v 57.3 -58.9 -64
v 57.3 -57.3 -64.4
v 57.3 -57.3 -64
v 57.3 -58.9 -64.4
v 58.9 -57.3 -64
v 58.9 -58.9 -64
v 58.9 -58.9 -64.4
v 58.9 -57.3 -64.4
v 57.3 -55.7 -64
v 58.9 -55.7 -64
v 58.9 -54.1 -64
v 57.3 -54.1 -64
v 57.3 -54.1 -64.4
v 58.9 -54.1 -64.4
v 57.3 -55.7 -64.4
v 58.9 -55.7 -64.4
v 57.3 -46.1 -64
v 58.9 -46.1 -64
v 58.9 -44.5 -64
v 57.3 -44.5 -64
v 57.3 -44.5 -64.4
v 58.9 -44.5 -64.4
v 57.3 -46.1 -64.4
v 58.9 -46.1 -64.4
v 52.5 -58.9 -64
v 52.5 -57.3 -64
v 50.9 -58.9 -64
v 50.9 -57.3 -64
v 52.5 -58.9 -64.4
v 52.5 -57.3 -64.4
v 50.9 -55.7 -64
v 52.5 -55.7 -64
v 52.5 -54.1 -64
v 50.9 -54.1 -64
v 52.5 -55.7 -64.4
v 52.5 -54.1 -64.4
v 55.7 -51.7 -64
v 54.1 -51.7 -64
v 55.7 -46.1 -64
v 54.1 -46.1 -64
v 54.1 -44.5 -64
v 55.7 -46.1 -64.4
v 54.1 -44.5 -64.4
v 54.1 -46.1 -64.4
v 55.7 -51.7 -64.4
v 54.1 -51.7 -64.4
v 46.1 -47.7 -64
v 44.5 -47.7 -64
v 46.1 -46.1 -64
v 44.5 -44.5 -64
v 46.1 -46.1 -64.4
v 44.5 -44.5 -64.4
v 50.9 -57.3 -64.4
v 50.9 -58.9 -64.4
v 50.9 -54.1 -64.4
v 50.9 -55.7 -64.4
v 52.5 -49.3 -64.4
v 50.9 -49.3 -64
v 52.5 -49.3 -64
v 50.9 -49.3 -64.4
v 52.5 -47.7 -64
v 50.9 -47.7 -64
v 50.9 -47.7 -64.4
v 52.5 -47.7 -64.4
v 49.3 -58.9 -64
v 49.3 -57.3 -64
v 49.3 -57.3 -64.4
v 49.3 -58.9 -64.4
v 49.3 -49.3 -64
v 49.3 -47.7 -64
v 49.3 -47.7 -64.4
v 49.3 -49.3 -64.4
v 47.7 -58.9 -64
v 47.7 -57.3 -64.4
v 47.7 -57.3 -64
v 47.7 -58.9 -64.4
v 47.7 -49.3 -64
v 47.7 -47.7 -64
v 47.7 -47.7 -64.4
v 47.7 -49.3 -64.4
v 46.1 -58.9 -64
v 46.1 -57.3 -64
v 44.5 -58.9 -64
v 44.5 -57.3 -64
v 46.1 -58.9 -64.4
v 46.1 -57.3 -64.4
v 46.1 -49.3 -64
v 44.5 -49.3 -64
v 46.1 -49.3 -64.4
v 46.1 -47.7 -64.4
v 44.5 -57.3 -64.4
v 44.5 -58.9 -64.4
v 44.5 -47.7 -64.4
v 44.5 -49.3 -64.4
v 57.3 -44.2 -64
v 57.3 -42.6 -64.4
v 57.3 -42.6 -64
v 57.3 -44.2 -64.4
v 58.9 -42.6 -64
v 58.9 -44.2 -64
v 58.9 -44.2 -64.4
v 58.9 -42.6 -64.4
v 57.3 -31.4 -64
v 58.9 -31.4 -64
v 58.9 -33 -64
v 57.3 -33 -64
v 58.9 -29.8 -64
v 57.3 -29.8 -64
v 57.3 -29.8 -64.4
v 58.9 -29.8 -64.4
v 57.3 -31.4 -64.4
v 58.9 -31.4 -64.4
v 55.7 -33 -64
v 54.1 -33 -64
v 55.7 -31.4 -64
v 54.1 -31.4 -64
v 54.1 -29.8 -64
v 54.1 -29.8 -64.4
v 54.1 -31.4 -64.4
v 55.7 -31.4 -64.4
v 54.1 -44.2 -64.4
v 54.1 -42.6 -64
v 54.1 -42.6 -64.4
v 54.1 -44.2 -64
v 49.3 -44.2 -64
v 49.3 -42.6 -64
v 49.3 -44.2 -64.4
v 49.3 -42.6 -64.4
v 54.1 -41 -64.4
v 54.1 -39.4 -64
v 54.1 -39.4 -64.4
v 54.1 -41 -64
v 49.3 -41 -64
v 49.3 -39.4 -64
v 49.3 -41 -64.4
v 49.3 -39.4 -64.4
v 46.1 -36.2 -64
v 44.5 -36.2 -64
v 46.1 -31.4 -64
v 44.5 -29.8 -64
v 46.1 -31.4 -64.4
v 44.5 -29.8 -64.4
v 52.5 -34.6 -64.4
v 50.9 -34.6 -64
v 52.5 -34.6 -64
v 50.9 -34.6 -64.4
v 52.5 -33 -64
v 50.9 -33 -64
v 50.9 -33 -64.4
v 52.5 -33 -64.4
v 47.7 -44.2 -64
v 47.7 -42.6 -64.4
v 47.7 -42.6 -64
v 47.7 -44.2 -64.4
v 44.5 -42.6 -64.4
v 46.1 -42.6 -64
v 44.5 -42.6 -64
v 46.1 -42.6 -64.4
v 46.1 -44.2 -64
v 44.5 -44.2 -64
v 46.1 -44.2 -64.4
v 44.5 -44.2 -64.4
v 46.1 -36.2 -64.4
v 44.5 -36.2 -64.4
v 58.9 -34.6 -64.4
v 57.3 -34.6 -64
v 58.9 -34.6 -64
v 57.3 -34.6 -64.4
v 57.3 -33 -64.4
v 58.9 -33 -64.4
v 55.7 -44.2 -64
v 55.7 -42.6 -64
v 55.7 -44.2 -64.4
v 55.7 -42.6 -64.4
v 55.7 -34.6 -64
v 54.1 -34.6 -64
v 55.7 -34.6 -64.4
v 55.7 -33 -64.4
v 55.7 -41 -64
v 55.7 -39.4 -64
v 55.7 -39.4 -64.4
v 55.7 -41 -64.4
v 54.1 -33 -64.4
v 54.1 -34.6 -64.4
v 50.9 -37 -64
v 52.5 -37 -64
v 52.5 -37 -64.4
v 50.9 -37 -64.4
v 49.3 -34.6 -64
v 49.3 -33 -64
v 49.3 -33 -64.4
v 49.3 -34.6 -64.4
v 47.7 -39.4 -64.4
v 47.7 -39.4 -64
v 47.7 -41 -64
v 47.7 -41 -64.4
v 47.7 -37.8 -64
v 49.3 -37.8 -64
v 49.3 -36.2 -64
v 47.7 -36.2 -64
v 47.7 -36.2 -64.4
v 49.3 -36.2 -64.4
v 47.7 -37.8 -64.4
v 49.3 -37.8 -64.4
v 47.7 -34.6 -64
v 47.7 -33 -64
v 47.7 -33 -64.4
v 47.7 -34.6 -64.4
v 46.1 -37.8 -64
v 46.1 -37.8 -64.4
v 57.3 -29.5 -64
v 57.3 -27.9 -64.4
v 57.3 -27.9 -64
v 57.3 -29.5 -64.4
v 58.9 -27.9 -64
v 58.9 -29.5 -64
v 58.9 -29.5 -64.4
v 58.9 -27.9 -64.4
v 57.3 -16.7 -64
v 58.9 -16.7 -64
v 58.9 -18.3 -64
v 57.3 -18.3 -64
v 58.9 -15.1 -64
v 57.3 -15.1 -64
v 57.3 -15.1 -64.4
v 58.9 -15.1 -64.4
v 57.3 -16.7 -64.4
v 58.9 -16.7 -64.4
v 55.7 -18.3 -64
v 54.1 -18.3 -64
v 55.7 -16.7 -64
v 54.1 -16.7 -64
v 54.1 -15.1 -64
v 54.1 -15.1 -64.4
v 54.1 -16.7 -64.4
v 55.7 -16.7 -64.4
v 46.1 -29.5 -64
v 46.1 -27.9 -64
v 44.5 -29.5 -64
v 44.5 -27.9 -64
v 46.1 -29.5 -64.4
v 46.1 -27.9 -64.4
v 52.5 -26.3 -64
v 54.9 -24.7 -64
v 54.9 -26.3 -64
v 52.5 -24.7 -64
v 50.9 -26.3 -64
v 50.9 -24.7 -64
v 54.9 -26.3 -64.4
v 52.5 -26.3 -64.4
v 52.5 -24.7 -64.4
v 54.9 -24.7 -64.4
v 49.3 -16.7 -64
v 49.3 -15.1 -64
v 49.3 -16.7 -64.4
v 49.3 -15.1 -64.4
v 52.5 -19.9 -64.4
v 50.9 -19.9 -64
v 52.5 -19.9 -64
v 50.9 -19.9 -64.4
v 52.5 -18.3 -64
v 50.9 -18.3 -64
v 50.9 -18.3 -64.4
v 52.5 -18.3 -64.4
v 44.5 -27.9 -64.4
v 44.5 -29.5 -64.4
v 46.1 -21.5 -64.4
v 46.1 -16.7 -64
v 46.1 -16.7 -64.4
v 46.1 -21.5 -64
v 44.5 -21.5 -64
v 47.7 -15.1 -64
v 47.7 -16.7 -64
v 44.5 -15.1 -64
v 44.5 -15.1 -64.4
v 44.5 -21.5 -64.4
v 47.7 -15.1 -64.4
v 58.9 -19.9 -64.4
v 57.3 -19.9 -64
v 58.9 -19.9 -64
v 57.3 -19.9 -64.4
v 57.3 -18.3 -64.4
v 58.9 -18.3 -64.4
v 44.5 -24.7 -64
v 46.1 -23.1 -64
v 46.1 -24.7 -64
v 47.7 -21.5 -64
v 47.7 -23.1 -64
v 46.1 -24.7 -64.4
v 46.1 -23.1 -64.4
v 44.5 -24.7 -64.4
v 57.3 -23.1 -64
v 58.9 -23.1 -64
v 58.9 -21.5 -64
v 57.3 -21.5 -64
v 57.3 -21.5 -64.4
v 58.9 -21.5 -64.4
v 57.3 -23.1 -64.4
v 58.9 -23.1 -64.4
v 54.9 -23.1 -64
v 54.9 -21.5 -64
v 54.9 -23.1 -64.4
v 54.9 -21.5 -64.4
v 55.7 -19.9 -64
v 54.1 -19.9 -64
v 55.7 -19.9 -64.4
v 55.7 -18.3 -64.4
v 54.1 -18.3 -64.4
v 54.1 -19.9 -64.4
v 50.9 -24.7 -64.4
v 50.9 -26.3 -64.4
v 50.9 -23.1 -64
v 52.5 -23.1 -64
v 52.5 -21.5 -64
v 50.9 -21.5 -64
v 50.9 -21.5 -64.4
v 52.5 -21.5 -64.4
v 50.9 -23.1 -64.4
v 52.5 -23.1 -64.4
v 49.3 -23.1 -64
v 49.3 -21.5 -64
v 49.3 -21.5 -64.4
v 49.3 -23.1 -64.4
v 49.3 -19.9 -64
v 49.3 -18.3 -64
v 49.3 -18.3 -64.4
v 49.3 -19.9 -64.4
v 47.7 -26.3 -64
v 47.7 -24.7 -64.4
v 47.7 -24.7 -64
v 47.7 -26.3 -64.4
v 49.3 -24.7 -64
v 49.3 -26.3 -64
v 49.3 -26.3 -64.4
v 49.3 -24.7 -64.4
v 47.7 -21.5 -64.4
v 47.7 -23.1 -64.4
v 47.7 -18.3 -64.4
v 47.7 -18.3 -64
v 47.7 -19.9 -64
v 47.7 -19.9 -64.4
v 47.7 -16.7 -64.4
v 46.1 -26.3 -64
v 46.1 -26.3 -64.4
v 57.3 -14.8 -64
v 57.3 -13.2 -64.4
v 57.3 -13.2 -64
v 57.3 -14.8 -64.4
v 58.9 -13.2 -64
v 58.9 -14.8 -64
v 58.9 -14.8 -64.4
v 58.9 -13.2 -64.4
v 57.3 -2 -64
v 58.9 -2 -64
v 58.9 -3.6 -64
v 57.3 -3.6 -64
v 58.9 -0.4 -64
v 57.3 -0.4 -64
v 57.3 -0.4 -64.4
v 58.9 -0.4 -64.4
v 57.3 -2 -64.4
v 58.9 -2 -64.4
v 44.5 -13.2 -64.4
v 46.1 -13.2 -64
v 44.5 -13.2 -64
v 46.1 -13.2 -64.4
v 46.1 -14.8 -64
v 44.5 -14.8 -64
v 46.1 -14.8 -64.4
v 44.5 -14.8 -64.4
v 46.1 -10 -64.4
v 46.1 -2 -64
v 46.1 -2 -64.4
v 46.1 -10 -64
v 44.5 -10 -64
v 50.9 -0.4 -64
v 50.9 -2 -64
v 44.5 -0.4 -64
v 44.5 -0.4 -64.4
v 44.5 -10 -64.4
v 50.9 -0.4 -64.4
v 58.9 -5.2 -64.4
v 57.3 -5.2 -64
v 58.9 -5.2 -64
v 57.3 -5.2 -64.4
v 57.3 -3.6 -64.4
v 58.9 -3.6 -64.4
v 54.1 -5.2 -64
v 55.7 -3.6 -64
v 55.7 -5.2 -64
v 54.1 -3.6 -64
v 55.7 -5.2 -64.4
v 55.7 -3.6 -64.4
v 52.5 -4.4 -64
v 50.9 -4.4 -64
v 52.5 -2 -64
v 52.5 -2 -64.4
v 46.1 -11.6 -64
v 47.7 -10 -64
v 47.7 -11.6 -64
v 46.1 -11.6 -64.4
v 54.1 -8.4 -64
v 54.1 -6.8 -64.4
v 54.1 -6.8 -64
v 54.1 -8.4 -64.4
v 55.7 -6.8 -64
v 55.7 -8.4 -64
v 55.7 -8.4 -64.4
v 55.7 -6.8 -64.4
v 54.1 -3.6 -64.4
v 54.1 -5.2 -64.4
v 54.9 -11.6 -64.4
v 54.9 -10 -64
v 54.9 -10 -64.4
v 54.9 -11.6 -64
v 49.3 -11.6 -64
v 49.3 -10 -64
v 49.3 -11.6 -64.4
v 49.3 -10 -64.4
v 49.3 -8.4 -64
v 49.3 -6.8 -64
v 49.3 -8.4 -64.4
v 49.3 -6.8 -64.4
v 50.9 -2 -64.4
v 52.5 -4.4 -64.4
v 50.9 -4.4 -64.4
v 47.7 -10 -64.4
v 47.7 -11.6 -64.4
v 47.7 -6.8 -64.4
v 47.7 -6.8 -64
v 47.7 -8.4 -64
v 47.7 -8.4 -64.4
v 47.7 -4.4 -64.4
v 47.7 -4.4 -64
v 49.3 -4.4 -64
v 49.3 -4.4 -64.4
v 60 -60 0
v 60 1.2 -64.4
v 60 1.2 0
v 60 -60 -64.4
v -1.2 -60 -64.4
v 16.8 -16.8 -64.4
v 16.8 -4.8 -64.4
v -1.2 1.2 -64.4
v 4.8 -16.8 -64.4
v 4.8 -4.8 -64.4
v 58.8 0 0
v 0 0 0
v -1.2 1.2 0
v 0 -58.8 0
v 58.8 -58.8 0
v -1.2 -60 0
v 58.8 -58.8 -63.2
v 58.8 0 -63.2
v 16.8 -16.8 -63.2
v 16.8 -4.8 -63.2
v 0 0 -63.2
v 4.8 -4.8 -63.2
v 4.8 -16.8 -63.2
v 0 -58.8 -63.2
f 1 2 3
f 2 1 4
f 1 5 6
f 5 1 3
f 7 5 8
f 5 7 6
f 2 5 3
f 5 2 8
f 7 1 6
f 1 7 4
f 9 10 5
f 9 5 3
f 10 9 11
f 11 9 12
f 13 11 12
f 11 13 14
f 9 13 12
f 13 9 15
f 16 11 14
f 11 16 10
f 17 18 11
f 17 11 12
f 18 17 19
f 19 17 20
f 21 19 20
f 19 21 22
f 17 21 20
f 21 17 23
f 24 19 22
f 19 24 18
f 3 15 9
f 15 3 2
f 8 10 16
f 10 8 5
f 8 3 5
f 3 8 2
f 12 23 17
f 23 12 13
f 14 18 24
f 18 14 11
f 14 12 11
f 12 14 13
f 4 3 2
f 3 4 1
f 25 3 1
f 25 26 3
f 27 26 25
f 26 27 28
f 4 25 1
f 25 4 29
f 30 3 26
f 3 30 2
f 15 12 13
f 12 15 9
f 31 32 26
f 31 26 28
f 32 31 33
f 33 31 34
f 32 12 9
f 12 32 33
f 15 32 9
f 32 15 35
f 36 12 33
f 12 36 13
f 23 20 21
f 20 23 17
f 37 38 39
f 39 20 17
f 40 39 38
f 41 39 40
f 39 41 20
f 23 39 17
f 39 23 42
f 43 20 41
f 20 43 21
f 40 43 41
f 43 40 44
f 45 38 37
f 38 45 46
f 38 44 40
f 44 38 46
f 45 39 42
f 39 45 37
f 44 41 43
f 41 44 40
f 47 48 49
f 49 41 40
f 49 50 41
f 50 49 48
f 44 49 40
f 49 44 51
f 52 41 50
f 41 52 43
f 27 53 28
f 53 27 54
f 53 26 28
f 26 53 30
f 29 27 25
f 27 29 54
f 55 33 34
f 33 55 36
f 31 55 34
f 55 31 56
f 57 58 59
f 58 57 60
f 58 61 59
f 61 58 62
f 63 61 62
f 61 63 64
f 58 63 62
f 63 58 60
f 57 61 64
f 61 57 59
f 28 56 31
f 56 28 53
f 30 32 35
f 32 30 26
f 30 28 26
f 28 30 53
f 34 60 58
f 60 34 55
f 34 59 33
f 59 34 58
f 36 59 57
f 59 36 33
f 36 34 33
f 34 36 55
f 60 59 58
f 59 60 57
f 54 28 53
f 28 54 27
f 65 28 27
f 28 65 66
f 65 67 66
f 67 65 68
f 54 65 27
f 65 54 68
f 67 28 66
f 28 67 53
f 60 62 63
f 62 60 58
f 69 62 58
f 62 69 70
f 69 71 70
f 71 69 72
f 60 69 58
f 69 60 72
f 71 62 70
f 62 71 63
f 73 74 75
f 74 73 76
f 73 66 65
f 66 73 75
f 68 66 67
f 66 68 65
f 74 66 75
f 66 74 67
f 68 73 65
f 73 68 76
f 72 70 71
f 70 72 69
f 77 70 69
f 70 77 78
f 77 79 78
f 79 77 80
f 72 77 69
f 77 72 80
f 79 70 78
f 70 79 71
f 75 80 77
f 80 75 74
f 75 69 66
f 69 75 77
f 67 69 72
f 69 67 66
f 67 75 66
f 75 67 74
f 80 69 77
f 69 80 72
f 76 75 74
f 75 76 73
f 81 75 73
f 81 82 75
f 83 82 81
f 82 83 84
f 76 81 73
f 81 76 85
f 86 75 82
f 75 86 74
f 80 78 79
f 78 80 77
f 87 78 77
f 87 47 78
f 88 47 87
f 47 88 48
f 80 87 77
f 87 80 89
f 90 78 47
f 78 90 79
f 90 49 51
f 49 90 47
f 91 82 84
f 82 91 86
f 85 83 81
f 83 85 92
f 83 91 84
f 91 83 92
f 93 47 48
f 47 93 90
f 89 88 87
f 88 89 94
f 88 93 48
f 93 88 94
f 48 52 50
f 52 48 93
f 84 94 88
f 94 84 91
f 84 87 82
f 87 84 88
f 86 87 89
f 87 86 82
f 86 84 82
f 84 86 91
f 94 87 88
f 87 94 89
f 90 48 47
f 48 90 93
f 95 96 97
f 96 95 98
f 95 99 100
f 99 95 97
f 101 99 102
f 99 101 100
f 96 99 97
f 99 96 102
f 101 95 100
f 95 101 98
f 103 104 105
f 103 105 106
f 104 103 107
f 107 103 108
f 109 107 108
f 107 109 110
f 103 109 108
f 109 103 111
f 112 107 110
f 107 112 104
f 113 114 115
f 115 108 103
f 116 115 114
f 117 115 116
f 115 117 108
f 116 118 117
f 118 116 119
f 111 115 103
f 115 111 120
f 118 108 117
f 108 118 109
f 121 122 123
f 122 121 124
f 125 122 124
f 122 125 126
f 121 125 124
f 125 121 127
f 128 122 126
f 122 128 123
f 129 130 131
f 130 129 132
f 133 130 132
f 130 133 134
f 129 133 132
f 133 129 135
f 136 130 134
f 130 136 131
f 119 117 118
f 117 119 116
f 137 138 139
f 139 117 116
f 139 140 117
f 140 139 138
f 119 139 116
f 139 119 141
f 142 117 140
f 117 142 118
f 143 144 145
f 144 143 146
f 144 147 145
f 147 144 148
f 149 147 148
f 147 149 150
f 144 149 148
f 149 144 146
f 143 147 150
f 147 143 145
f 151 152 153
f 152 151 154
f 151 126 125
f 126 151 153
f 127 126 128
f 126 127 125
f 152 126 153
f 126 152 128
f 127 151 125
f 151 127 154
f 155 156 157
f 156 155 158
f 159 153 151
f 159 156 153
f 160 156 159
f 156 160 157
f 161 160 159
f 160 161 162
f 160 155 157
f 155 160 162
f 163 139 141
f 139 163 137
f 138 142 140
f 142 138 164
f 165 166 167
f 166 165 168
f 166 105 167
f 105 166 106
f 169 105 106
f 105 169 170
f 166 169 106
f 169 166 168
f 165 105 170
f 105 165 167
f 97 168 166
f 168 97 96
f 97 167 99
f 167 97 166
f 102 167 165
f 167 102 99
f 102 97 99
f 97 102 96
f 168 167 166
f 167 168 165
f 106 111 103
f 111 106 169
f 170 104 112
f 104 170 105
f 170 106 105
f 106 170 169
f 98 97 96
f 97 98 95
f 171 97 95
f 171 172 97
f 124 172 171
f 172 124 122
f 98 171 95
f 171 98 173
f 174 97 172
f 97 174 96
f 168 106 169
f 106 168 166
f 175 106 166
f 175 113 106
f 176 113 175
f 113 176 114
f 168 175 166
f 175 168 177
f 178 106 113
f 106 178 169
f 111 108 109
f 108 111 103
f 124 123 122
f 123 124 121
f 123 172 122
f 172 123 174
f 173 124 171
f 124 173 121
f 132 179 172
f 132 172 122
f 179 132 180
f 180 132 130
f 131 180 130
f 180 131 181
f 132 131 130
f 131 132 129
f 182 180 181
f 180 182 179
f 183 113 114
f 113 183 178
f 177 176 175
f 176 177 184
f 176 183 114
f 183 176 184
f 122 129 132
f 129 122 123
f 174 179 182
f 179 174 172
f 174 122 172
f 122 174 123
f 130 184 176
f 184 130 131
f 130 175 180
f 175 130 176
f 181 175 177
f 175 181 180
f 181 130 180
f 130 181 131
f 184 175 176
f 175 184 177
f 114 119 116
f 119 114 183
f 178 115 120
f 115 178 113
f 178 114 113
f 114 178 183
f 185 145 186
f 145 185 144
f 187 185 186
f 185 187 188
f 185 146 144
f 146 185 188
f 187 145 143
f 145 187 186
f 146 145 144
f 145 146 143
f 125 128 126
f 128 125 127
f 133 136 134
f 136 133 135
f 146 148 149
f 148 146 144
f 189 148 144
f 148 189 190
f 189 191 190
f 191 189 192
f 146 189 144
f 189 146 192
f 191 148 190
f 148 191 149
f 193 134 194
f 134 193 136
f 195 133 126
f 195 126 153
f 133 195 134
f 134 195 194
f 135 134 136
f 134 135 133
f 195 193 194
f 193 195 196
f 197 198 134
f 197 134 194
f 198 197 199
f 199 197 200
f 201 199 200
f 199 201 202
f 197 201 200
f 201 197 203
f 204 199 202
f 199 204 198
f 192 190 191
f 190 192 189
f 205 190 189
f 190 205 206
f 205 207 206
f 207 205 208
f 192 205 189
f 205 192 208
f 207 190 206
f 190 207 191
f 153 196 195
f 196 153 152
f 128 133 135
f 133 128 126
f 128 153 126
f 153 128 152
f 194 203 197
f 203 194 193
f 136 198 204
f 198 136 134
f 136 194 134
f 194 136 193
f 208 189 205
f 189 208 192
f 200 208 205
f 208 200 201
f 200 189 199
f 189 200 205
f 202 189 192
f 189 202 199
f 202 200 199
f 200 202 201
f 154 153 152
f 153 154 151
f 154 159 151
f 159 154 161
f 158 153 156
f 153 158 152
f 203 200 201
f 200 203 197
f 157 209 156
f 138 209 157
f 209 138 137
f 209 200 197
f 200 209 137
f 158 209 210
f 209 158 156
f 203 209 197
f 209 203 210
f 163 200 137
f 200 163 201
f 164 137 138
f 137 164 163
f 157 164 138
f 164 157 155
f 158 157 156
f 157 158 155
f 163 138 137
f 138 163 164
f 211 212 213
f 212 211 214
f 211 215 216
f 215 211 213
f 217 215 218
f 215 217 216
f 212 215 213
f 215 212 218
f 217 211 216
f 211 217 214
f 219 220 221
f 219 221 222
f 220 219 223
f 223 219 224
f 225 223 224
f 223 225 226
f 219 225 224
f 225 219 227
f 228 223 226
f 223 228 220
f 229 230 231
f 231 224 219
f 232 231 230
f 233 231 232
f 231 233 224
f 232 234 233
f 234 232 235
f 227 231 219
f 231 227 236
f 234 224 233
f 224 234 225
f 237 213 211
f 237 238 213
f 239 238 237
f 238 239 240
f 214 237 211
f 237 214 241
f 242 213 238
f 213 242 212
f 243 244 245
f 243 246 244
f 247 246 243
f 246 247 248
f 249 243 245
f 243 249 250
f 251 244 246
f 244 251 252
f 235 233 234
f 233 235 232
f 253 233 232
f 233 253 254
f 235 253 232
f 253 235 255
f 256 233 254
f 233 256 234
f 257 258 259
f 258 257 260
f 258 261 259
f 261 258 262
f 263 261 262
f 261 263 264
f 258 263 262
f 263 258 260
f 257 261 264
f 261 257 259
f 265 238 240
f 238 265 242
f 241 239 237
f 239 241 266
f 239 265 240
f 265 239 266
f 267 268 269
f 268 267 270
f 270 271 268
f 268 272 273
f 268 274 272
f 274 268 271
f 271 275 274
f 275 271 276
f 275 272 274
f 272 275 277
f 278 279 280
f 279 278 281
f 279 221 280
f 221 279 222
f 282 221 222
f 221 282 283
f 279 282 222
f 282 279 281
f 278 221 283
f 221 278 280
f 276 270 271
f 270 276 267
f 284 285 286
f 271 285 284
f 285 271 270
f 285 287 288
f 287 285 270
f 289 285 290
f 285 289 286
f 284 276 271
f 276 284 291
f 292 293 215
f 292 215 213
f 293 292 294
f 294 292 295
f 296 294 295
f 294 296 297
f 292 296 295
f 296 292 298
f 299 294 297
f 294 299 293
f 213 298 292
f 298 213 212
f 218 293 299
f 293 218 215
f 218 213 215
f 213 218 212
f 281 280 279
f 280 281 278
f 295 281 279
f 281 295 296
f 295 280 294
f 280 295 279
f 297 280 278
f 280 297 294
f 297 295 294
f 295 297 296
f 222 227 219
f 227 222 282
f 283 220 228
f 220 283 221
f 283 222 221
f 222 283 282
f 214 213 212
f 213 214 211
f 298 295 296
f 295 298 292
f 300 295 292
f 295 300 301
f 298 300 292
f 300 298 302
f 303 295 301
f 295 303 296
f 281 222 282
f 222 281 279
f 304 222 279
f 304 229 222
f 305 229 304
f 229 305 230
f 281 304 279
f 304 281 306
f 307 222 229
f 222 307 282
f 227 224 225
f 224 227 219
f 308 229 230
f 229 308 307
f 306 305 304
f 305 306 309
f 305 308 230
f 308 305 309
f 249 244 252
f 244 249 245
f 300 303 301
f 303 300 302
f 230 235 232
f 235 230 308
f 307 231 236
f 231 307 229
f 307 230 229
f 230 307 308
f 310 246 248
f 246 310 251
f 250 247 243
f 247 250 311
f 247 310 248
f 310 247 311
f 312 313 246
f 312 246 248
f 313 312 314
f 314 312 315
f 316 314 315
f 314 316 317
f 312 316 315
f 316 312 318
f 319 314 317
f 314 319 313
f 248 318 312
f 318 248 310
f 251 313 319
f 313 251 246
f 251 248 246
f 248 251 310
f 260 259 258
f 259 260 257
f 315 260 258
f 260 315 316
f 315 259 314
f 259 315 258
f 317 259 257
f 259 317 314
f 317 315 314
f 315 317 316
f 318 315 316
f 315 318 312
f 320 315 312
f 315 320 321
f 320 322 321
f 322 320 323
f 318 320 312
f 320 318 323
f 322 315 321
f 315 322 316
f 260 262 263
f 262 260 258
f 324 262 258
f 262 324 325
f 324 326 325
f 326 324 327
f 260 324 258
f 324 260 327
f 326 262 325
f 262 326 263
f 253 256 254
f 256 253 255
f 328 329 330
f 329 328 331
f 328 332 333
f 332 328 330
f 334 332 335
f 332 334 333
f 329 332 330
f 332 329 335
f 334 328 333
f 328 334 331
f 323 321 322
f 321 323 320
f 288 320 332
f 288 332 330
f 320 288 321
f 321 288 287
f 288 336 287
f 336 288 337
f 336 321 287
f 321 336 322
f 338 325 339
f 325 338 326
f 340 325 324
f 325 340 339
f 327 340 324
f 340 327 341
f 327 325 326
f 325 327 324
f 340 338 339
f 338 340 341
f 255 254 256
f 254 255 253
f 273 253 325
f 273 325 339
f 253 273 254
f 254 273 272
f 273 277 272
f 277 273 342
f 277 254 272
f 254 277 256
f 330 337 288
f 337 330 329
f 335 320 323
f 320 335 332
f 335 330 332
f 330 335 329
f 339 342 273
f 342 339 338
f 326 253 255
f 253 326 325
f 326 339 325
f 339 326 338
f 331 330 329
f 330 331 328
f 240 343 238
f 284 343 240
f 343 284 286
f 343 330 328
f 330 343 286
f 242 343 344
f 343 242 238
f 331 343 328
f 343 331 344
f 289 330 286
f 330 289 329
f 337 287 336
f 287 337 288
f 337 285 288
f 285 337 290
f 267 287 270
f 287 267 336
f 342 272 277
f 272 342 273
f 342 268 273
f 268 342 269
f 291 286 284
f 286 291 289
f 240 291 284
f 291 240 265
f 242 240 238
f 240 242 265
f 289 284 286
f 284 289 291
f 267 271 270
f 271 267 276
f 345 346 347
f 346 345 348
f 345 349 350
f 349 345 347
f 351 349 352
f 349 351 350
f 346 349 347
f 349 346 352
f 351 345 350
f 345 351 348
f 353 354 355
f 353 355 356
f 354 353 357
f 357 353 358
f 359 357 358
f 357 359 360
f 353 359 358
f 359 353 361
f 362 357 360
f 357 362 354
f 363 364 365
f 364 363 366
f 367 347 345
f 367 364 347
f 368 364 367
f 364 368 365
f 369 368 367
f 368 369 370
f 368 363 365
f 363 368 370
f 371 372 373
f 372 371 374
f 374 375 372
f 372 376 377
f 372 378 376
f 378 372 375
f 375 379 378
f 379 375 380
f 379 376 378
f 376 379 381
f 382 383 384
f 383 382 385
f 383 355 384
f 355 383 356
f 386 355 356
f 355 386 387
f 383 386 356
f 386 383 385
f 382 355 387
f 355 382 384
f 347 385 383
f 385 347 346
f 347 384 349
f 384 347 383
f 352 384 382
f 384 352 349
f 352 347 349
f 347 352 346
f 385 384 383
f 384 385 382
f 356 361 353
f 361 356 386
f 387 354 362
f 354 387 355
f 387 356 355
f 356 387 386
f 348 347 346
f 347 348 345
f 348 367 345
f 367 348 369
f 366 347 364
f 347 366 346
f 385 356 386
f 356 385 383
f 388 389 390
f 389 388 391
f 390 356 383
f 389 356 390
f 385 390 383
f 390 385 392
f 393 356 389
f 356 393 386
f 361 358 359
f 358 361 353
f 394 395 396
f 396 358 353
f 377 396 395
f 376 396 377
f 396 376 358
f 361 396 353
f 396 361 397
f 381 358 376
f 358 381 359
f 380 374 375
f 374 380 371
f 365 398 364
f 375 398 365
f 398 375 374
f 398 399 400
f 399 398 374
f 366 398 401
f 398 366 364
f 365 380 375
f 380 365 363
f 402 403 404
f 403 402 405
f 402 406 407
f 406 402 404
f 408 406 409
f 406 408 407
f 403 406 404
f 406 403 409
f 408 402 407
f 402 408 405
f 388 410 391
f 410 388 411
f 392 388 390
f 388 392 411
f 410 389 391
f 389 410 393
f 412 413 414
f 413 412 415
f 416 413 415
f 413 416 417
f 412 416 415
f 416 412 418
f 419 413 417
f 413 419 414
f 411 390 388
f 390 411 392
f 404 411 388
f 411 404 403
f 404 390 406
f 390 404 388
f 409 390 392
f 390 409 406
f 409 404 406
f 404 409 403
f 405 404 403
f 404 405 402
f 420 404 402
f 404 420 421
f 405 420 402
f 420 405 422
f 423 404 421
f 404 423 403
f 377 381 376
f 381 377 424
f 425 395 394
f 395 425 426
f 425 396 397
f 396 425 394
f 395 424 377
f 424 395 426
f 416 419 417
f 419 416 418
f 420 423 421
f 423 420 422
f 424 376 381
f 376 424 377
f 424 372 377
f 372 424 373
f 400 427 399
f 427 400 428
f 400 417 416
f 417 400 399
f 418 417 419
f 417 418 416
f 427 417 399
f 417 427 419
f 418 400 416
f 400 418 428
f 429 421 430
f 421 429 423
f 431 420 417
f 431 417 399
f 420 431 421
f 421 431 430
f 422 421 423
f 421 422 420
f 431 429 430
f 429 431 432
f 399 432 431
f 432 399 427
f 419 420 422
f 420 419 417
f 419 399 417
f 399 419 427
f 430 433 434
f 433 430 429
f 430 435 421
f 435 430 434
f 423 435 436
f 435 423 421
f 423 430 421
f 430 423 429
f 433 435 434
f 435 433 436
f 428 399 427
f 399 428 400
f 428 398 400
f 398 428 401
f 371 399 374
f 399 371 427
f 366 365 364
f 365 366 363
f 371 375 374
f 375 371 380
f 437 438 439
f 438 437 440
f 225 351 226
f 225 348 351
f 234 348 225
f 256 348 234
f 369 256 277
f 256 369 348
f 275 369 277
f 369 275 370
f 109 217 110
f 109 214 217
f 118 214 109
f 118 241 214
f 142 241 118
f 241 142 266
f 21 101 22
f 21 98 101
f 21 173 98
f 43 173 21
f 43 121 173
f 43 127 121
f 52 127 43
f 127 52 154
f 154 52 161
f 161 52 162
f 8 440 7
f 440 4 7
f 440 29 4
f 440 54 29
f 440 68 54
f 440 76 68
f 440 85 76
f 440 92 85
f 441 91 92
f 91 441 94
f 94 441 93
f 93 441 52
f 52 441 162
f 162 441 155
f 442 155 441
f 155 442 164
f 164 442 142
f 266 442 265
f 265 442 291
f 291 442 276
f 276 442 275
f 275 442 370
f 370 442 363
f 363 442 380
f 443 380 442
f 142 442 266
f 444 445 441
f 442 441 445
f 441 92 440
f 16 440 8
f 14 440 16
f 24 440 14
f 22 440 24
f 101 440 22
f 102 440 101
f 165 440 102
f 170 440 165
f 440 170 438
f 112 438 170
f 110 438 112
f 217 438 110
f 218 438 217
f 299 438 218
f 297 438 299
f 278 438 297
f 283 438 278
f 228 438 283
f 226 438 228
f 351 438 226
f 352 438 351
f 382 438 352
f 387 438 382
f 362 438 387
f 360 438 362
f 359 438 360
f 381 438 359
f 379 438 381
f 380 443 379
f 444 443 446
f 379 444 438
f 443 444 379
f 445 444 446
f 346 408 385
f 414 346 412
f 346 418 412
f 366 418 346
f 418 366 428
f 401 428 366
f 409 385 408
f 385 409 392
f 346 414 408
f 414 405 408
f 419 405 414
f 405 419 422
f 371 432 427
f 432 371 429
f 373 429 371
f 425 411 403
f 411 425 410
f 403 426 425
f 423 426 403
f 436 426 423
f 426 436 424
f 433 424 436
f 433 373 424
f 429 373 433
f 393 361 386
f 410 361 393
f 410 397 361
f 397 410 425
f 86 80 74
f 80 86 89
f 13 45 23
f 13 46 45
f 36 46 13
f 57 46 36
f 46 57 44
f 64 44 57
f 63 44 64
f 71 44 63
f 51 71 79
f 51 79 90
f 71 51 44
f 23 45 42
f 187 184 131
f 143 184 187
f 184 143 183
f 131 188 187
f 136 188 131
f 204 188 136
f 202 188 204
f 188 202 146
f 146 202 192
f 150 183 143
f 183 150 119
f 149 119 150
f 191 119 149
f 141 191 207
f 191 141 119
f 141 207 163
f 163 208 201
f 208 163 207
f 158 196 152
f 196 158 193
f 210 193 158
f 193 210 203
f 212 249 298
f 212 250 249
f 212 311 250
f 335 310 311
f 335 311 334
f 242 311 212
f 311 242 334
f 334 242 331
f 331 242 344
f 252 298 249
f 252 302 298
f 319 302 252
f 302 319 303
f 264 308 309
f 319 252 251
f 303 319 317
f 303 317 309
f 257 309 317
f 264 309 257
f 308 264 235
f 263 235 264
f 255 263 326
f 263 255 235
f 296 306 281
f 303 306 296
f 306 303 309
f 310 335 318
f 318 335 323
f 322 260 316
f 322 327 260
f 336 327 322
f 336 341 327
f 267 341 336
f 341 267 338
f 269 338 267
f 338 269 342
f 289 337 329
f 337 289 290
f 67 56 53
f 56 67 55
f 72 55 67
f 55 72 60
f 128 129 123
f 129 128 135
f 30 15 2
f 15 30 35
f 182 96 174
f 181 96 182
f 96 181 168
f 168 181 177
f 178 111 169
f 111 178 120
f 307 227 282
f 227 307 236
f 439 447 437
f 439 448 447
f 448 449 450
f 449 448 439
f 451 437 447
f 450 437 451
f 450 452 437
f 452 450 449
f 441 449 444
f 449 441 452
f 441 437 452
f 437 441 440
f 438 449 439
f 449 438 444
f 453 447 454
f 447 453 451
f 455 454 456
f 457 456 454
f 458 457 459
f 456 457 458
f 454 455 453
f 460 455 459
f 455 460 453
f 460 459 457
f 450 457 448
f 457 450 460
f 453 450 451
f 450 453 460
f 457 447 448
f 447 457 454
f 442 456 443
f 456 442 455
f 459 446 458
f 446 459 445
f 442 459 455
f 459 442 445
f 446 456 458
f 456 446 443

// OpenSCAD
// file: ../../code/enclosing-box.scad
module box(levels) {
    count = len(levels);
    l1 = levels[0];
    sw = len(l1);
    extraSpace = 3*nozzleDiameter;
    bt = nozzleDiameter*3; // box wall thickness
    
    b1Xs = sw*w + extraSpace; // box inside X size
    b1Ys = b1Xs;
    b1Zs = (wh-levelOverlap)*count+levelOverlap + extraSpace;
    
    
    echo("Box insides: ", b1Xs, b1Ys, b1Zs);
    rotate([180,0,0])
    difference() {
        translate([-bt, -bt, 0])
            cube([
                b1Xs+2*bt, 
                b1Ys+2*bt, 
                b1Zs+1*bt
            ]);
        cube([b1Xs, b1Ys, b1Zs]);

        
        // hole for ball entrance
        xy=extraSpace+w/2;
        translate([xy,xy,b1Zs+bt-2*layerHeight]) {
            holes(l1, STARTING_POINT);
        }

        
        translate([0,0,b1Zs+bt-2*layerHeight]) {
            // draw levels on box
            for(i = [1:count]) {
                marginX =     b1Ys/count   - extraSpace;
                marginY = (i*(b1Ys/count)) - extraSpace;
                translate([b1Xs-marginX, b1Ys-marginY, 0])
                levelContour(levels[i-1], count);
            }
        }
    }   
}


module levelContour(level, count) {
    // scale down to fit all mazes into one row on top of the box
    scale(1/count) {
        // count is used in wallThickness multiplication here to compensate scale down factor
        // also, to make walls visible better, increasing adding additional multiplication factor
        walls(level, 2*count*wallThickness); 
    }
}
// file: ../../code/main.scad
include <enclosing-box.scad>;

// DRAWING SYMBOLS
WALL_VERTICAL = "|";
WALL_VERTICAL_TOP = "╹";
WALL_VERTICAL_BOTTOM = "╻";
WALL_HORIZONTAL = "─";
WALL_HORIZONTAL_LEFT = "╸";
WALL_HORIZONTAL_RIGHT = "╺";

CORNER_PLUS="+";

CORNER_TOP_LEFT="┌";
CORNER_TOP_RIGHT= "┐";
CORNER_BOTTOM_RIGHT="┘";
CORNER_BOTTOM_LEFT="└";

CORNER_T="┬";
CORNER_T_DOWN="┴";
CORNER_T_LEFT="├";
CORNER_T_RIGHT="┤";

SPACE = " ";
HOLE = "X";
STARTING_POINT = "O";

template3x3 = [
"┌───────┐",
"|X      |",
"| ┌─┬─┐ |",
"| | ╹ | |",
"| ├╸+╺┤ |",
"| | ╻ | |",
"| └─┴─┘ |",
"|      O|",
"└───────┘"];


// PARAMETERS
ballSize = 12;

levelOverlap = 2; // how much below level should go into the bottom plate
bpt = levelOverlap + 1; // bottom plate thickness
nozzleDiameter = 0.4;
layerHeight = 0.2;
wallThickness = nozzleDiameter*2; // wall thickness
wh = ballSize+bpt+levelOverlap; // wall height


// VARIABLES
w = ballSize/2+wallThickness/2; // width of the cell


// HELPER METHODS
module labyrinthLevels(currentLevel, levelBelow) {
    difference() {
        labyrinth(currentLevel);
        translate([0,0,-wh+levelOverlap])
            labyrinth(levelBelow, wallThickness+nozzleDiameter*2); // add extra two lines space for walls' overlap
    }
}

module labyrinth(lab, wallThickness = wallThickness) {
    bottom(lab);
    walls(lab, wallThickness);
}

module bottom(lab) {
    sw=len(lab[0]);
    boardSize = sw*w;
    difference() {
        translate([-w/2,-w/2,0])
            cube([boardSize, boardSize, bpt]);
        holes(lab);
    }
}

module walls(lab, wallThickness=wallThickness) {
    sw=len(lab[0]);
    for(x=[0:sw-1]) {
        for(y=[0:sw-1]) {
            cell = lab[x][y];
            tx=sw-x-1; ty=sw-y-1;
            translate([tx*w, ty*w, 0]) {
                if (cell == WALL_VERTICAL) {
                    wallVertical(wallThickness);
                } else if (cell == WALL_VERTICAL_TOP) {
                    wallVerticalTop(wallThickness);
                } else if (cell == WALL_VERTICAL_BOTTOM) {
                    wallVerticalBottom(wallThickness);
                } else if (cell == WALL_HORIZONTAL) {
                    wallHorizontal(wallThickness);
                } else if (cell == WALL_HORIZONTAL_LEFT) {
                    wallHorizontalLeft(wallThickness);
                } else if (cell == WALL_HORIZONTAL_RIGHT) {
                    wallHorizontalRight(wallThickness);
                } else if (cell == CORNER_TOP_LEFT) {
                    cornerTopLeft(wallThickness);
                } else if (cell == CORNER_TOP_RIGHT) {
                    cornerTopRight(wallThickness);
                } else if (cell == CORNER_BOTTOM_RIGHT) {
                    cornerBottomRight(wallThickness);
                } else if (cell == CORNER_BOTTOM_LEFT) {
                    cornerBottomLeft(wallThickness);
                } else if (cell == CORNER_T) {
                    cornerT(wallThickness);
                } else if (cell == CORNER_T_RIGHT) {
                    cornerTRight(wallThickness);
                } else if (cell == CORNER_T_DOWN) {
                    cornerTDown(wallThickness);
                } else if (cell == CORNER_T_LEFT) {
                    cornerTLeft(wallThickness);
                } else if (cell == CORNER_PLUS) {
                    cornerPlus(wallThickness);
                }
            }
        }
    }
}

module holes(lab, holeSymbol = HOLE) {
    sw=len(lab[0]);
    for(x=[0:sw-1]) {
        for(y=[0:sw-1]) {
            cell = lab[x][y];
            if (cell == holeSymbol) {
                tx=sw-x-1; ty=sw-y-1;
                translate([tx*w, ty*w, 0]) {
                    hole();
                }
            }
        }
    }
}

module hole() {
    s=w+w-wallThickness;
    translate([-s/2,-s/2, -1])
        cube([s, s, bpt+2]);
}

module wallHorizontal(wallThickness) {
    rotate([0,0,90])
        wall(wallThickness);
}

module wallVertical(wallThickness) {
    wall(wallThickness);
}
module wallVerticalTop(wallThickness) {
    wallHalf(wallThickness);
}
module wallVerticalBottom(wallThickness) {
    rotate([0,0,180])
        wallHalf(wallThickness);
}
module wallHorizontalLeft(wallThickness) {
    rotate([0,0,90])
        wallHalf(wallThickness);
}
module wallHorizontalRight(wallThickness) {
    rotate([0,0,270])
        wallHalf(wallThickness);
}

module wall(wallThickness) {
    translate([-w/2,-wallThickness/2, 0])
        cube([w, wallThickness, wh]);
}
module wallHalf(wallThickness) {
    translate([0,-wallThickness/2, 0])
        cube([w/2, wallThickness, wh]);
}

module cornerTopLeft(wallThickness) {
    rotate([0,0,180])
        corner(wallThickness);
}
module cornerTopRight(wallThickness) {
    rotate([0,0,90])
        corner(wallThickness);
}
module cornerBottomRight(wallThickness) {
    corner(wallThickness);
}
module cornerBottomLeft(wallThickness) {
    rotate([0,0,270])
        corner(wallThickness);
}

module corner(wallThickness) {
    translate([-wallThickness/2,-wallThickness/2,0])
        cube([wallThickness, w/2+wallThickness/2, wh]);
    translate([-wallThickness/2,-wallThickness/2, 0])
        cube([w/2+wallThickness/2, wallThickness, wh]);
}

module cornerPlus(wallThickness) {
    translate([-w/2,-wallThickness/2, 0])
        cube([w, wallThickness, wh]);    
    translate([-wallThickness/2,-w/2,0])
        cube([wallThickness, w, wh]);
}

module cornerT(wallThickness) {
    rotate([0,0,90]) {
        translate([-w/2,-wallThickness/2, 0])
            cube([w, wallThickness, wh]);    
        translate([-wallThickness/2,-wallThickness/2,0])
            cube([wallThickness, w/2+wallThickness/2, wh]);
    }
}

module cornerTRight(wallThickness) {
    rotate([0,0,270])
        cornerT(wallThickness);
}

module cornerTDown(wallThickness) {
    rotate([0,0,180])
        cornerT(wallThickness);
}

module cornerTLeft(wallThickness) {
    rotate([0,0,90])
        cornerT(wallThickness);
}
// main file
include <../../code/main.scad>

//labyrinthLevels(level1, level2);
//labyrinthLevels(level2, level3);
//labyrinthLevels(level3, level4);
//labyrinth(level4);
box([level1,level2,level3,level4]);

template4x4 = [
"┌───────┐",
"|X      |",
"| ┌─┬─┐ |",
"| | ╹ | |",
"| ├╸+╺┤ |",
"| | ╻ | |",
"| └─┴─┘ |",
"|      O|",
"└───────┘"];

level1 = [
"┌─┬─────┐",
"|X|    X|",
"| | ╺───┤",
"|X|     |",
"├─┴───┐ |",
"|X   X| |",
"├─────┤ |",
"|X   X|O|",
"└─────┴─┘"];

level2 = [
"┌─────┬─┐",
"|    X|X|",
"├─┬───┴─┤",
"| |     |",
"| | ╺─┐ |",
"| |   | |",
"├─┴─┬─┘ |",
"|  X|   |",
"└───┴───┘"];

level3 = [
"┌───┬─┬─┐",
"|   | |X|",
"| ╻ ╹ └─┤",
"| |     |",
"| └─┬─┐ |",
"|   | | |",
"| ┌─┤ └─┤",
"|X|X|  X|",
"└─┴─┴───┘"];

level4 = [
"┌─────┬─┐",
"|     | |",
"| ╻ ┌─┘ |",
"| | |   |",
"| | | ╺─┤",
"| |X|   |",
"| ├─┴─╸ |",
"| |     |",
"└─┴─────┘"];
